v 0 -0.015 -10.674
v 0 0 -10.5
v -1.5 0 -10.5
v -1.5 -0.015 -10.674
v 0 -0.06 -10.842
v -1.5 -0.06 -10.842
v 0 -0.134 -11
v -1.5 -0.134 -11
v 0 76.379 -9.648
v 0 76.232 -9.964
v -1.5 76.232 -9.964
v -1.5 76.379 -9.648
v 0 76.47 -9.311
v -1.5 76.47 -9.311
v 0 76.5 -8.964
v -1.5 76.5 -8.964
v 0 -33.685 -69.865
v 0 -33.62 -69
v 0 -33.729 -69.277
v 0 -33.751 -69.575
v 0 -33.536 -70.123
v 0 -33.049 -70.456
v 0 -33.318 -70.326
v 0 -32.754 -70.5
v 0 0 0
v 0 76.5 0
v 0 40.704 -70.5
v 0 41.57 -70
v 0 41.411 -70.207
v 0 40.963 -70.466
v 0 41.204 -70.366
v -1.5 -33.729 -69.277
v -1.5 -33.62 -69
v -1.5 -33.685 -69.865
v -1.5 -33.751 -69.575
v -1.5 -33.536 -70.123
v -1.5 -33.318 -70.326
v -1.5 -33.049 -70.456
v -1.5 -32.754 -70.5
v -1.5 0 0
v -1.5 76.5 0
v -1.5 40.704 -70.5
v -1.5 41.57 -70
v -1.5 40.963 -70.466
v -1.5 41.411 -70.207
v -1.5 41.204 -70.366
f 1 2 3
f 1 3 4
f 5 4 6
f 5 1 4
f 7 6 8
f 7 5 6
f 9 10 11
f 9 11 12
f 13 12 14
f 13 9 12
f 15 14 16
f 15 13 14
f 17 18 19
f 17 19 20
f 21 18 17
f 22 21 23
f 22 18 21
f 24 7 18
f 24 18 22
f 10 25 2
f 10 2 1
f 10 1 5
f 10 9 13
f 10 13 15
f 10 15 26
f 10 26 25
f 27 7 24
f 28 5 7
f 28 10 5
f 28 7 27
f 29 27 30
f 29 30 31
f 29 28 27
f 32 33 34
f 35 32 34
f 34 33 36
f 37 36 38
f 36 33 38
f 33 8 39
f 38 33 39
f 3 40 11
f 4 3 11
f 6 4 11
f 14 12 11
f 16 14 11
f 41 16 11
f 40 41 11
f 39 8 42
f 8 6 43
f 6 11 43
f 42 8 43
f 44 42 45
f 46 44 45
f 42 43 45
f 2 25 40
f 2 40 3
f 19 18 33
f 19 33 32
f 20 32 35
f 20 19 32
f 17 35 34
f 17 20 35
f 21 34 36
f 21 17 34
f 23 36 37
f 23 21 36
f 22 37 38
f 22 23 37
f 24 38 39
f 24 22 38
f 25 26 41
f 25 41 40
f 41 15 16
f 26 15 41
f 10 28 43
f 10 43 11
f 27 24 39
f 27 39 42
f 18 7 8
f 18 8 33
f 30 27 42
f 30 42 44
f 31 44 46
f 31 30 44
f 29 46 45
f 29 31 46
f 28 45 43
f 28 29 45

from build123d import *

# Parameters (mm, degrees)
SM_BASE_FLANGE_1_DEPTH = 1.5


# Sheet-metal steps are written as plain solids
with BuildPart() as part:
    # Sketch 1 → Базовая кромка1 (new body)
    with BuildSketch(Plane(origin=(0, 0, 0), x_dir=(0, 0, -1), z_dir=(1, 0, 0))):
        with BuildLine():
            Line((0, 0), (10.5, 0))
            ThreePointArc((10.5, 0), (10.758819045, -0.034074174), (11, -0.133974596))
            Line((11, -0.133974596), (69, -33.620290209))
            ThreePointArc((69, -33.620290209), (70, -33.620290209), (70.5, -32.754264805))
            Line((70.5, -32.754264805), (70.5, 40.70428331))
            ThreePointArc((70.5, 40.70428331), (70.366025404, 41.20428331), (70, 41.570308714))
            Line((70, 41.570308714), (9.964101615, 76.232050808))
            ThreePointArc((9.964101615, 76.232050808), (9.481739705, 76.431851653), (8.964101615, 76.5))
            Line((8.964101615, 76.5), (0, 76.5))
            Line((0, 76.5), (0, 0))
        make_face()
    extrude(amount=-SM_BASE_FLANGE_1_DEPTH)


solid = part.part
